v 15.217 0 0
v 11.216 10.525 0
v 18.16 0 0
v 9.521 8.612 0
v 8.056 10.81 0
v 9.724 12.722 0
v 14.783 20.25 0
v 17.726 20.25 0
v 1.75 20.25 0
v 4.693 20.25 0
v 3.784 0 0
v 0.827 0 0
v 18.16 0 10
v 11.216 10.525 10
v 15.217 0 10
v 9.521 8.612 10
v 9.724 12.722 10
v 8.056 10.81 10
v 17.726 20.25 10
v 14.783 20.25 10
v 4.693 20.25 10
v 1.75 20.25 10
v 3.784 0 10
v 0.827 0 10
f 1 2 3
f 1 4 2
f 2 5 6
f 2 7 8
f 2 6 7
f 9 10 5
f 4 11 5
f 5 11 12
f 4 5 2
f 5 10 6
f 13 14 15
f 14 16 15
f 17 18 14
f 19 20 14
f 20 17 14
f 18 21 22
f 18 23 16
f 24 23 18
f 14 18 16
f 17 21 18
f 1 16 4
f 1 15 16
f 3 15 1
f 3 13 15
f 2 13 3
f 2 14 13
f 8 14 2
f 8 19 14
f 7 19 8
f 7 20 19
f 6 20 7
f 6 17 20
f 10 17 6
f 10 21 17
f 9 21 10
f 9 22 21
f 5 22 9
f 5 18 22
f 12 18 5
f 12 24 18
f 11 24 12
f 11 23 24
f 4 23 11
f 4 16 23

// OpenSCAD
message = "X";
textsize = 20;
myfont = "Stencil";
height = 10;

linear_extrude(height){
    text(message, font=myfont,size=textsize);
}
